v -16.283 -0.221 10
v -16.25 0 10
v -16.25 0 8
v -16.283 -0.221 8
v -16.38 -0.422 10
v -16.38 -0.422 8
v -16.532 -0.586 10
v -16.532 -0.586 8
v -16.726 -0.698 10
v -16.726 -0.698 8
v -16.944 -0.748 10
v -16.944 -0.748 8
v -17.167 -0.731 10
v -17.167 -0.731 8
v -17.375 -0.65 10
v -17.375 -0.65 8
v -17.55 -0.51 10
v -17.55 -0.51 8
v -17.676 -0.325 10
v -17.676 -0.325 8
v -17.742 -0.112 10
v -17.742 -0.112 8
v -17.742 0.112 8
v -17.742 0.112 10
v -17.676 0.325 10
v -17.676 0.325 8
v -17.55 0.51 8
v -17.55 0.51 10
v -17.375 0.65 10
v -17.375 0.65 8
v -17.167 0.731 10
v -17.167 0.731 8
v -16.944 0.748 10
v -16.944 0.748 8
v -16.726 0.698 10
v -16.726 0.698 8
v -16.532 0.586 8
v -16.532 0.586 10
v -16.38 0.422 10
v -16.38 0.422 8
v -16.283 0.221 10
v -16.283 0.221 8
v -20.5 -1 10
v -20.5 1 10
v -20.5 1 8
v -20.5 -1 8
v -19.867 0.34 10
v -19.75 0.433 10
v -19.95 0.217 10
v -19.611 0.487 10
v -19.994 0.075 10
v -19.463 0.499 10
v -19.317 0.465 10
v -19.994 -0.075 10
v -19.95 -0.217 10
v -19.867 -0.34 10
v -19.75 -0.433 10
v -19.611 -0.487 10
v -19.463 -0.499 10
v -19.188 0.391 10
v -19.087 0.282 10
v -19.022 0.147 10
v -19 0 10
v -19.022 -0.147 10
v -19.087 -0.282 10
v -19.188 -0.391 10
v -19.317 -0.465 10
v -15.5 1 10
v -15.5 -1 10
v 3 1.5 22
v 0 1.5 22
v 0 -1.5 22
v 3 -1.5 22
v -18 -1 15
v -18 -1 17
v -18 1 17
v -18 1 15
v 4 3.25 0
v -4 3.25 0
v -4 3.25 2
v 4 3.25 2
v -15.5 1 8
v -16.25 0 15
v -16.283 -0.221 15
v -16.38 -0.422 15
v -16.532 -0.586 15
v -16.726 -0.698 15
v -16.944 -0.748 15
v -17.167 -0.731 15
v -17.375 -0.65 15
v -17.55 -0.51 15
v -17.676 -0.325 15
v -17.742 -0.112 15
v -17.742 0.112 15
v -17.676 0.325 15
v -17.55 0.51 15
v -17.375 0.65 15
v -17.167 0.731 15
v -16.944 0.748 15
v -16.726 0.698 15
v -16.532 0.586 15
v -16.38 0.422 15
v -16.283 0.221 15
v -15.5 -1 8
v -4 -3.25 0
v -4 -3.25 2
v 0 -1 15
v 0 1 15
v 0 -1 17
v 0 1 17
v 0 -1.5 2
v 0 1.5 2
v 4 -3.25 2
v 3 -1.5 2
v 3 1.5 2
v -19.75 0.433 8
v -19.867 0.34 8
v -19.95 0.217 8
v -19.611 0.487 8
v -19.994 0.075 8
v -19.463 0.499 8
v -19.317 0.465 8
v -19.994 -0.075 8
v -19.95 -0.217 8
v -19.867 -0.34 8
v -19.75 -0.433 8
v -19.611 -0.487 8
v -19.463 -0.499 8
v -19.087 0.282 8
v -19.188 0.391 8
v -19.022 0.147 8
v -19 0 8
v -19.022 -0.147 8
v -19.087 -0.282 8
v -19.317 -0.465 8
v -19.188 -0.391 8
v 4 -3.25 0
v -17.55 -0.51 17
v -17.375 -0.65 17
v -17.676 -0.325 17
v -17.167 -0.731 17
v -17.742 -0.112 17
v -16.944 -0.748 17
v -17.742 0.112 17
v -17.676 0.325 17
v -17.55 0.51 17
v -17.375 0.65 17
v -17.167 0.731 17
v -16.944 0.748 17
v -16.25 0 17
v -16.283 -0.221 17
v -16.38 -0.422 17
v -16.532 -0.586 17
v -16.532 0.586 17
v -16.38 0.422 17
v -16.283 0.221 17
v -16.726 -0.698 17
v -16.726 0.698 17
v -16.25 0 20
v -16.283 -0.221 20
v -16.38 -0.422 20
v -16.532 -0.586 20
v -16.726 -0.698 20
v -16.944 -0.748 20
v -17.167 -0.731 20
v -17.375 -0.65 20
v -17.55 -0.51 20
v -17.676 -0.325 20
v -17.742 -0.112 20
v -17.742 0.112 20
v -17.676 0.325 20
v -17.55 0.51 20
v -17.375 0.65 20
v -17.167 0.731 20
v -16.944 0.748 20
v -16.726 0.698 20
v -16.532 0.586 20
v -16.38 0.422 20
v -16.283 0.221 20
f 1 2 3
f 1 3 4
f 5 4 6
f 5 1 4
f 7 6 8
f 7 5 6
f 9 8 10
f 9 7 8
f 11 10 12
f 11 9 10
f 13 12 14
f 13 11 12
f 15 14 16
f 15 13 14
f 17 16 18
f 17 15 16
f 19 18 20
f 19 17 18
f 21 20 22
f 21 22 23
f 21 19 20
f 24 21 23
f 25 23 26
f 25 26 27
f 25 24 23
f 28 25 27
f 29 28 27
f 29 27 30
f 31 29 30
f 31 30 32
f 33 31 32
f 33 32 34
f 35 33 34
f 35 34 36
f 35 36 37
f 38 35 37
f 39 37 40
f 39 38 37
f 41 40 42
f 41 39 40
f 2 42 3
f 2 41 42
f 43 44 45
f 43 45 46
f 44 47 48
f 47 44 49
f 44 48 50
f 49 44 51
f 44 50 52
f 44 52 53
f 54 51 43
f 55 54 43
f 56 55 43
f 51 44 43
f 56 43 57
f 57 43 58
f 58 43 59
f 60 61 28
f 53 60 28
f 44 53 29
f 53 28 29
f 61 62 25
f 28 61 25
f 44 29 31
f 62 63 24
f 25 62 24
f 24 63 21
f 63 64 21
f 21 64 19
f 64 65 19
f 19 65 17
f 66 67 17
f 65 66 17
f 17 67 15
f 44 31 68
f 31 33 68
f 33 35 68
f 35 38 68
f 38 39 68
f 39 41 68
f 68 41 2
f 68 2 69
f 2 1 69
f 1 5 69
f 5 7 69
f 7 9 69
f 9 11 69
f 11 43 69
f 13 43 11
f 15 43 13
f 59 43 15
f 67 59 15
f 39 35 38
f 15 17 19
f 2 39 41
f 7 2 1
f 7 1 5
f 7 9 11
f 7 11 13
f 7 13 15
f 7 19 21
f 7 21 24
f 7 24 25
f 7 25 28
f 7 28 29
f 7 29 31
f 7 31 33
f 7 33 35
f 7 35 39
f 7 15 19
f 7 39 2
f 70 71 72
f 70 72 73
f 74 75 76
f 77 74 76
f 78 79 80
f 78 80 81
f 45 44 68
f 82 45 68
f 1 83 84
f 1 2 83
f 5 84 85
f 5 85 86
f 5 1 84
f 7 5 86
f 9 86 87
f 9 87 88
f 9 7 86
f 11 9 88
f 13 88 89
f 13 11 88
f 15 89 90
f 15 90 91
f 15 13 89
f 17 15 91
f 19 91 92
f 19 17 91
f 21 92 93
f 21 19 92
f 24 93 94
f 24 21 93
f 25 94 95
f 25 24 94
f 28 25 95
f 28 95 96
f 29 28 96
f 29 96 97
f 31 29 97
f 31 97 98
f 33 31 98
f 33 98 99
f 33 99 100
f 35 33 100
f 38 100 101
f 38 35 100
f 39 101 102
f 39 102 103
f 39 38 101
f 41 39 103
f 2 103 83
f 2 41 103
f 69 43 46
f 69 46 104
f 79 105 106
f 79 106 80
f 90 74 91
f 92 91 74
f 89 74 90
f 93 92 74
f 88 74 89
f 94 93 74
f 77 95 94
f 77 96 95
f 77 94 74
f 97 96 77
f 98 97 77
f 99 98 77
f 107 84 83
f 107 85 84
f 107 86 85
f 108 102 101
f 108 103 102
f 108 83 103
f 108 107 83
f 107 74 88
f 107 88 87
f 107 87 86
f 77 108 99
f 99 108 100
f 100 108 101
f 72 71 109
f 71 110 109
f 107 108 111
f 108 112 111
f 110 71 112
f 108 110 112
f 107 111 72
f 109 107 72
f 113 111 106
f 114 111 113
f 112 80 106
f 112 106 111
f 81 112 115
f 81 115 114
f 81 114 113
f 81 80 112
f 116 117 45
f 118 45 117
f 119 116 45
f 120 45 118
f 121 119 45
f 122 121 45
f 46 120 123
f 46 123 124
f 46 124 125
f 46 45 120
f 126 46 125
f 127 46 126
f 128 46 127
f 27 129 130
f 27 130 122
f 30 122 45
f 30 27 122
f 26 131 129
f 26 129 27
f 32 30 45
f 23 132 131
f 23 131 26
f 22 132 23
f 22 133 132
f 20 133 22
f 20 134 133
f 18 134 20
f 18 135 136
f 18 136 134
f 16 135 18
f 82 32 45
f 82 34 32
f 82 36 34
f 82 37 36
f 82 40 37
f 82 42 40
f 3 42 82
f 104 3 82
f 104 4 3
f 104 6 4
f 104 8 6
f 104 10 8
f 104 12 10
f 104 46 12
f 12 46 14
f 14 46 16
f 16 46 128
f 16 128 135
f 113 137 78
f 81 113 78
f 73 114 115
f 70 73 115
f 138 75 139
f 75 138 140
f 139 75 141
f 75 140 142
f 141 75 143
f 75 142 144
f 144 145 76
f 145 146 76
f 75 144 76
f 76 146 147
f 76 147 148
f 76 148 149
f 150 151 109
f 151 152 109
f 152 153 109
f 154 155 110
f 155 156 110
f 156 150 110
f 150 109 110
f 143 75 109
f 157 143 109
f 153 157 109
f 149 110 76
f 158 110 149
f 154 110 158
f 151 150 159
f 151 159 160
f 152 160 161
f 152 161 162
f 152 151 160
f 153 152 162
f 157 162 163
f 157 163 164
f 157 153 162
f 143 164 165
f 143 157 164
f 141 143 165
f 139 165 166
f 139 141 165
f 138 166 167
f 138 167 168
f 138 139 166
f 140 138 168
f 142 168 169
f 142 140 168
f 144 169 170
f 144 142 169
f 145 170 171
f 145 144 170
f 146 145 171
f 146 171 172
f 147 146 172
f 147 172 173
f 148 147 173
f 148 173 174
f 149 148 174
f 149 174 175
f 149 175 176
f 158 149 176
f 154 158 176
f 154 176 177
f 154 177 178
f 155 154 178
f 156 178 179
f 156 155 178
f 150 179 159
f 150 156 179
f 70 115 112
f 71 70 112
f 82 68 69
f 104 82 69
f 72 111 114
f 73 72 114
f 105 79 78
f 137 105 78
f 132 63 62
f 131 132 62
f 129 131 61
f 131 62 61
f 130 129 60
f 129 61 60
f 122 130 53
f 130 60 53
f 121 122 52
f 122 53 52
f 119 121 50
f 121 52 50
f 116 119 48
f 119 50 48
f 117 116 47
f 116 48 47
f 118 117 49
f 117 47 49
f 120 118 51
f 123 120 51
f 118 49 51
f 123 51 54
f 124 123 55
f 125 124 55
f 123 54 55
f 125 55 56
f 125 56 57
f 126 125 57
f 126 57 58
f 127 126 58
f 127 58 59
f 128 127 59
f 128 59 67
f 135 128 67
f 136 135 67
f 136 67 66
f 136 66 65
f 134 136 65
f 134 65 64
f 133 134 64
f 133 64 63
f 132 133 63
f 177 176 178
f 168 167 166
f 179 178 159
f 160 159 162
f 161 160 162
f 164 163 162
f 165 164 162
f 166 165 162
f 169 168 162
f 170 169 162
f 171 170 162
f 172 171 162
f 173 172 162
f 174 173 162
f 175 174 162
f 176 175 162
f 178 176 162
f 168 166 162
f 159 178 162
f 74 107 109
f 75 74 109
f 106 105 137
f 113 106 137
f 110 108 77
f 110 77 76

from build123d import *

# Parameters (mm, degrees)
F0_W      = 8
F0_H      = 6.5
F1_DEPTH  = 2
F3_DEPTH  = 20
F4_W      = 2
F4_H      = 2
F5_DEPTH  = 18
F6_R      = 0.75
F7_DEPTH  = 5
F8_W      = 5
F8_H      = 2
F8_R      = 0.75
F9_DEPTH  = 2
F10_R     = 0.5
F11_DEPTH = 25


with BuildPart() as f1:
    # F0 (on Top) → F1 (new body)
    with BuildSketch(Plane.XY):
        Rectangle(F0_W, F0_H)
    extrude(amount=F1_DEPTH)

    # F2 (on face) → F3 (join)
    with BuildSketch(Plane.XY.offset(2)):
        Polygon((0, 1.5), (0, 0), (0, -1.5), (3, -1.5), (3, 1.5), align=None)
    extrude(amount=F3_DEPTH)

    # F4 (on Right) → F5 (join)
    with BuildSketch(Plane.YZ):
        with Locations((0, 16)):
            Rectangle(F4_W, F4_H)
    extrude(amount=-F5_DEPTH)

    # F6 (on face) → F7 (join, symmetric)
    with BuildSketch(Plane(origin=(0, 0, 15), x_dir=(1, 0, 0), z_dir=(0, 0, -1))):
        with Locations((-17, 0)):
            Circle(F6_R)
    extrude(amount=F7_DEPTH, both=True)


with BuildPart() as f9:
    # F8 (on face) → F9 (new body)
    with BuildSketch(Plane(origin=(0, 0, 10), x_dir=(1, 0, 0), z_dir=(0, 0, -1))):
        with Locations((-18, 0)):
            Rectangle(F8_W, F8_H)
        with Locations((-17, 0)):
            Circle(F8_R, mode=Mode.SUBTRACT)
    extrude(amount=F9_DEPTH)

    # F10 (on face) → F11 (cut)
    with BuildSketch(Plane.XY.offset(10)):
        with Locations((-19.5, 0)):
            Circle(F10_R)
    extrude(amount=-F11_DEPTH, mode=Mode.SUBTRACT)


solid = Compound([f1.part, f9.part])
